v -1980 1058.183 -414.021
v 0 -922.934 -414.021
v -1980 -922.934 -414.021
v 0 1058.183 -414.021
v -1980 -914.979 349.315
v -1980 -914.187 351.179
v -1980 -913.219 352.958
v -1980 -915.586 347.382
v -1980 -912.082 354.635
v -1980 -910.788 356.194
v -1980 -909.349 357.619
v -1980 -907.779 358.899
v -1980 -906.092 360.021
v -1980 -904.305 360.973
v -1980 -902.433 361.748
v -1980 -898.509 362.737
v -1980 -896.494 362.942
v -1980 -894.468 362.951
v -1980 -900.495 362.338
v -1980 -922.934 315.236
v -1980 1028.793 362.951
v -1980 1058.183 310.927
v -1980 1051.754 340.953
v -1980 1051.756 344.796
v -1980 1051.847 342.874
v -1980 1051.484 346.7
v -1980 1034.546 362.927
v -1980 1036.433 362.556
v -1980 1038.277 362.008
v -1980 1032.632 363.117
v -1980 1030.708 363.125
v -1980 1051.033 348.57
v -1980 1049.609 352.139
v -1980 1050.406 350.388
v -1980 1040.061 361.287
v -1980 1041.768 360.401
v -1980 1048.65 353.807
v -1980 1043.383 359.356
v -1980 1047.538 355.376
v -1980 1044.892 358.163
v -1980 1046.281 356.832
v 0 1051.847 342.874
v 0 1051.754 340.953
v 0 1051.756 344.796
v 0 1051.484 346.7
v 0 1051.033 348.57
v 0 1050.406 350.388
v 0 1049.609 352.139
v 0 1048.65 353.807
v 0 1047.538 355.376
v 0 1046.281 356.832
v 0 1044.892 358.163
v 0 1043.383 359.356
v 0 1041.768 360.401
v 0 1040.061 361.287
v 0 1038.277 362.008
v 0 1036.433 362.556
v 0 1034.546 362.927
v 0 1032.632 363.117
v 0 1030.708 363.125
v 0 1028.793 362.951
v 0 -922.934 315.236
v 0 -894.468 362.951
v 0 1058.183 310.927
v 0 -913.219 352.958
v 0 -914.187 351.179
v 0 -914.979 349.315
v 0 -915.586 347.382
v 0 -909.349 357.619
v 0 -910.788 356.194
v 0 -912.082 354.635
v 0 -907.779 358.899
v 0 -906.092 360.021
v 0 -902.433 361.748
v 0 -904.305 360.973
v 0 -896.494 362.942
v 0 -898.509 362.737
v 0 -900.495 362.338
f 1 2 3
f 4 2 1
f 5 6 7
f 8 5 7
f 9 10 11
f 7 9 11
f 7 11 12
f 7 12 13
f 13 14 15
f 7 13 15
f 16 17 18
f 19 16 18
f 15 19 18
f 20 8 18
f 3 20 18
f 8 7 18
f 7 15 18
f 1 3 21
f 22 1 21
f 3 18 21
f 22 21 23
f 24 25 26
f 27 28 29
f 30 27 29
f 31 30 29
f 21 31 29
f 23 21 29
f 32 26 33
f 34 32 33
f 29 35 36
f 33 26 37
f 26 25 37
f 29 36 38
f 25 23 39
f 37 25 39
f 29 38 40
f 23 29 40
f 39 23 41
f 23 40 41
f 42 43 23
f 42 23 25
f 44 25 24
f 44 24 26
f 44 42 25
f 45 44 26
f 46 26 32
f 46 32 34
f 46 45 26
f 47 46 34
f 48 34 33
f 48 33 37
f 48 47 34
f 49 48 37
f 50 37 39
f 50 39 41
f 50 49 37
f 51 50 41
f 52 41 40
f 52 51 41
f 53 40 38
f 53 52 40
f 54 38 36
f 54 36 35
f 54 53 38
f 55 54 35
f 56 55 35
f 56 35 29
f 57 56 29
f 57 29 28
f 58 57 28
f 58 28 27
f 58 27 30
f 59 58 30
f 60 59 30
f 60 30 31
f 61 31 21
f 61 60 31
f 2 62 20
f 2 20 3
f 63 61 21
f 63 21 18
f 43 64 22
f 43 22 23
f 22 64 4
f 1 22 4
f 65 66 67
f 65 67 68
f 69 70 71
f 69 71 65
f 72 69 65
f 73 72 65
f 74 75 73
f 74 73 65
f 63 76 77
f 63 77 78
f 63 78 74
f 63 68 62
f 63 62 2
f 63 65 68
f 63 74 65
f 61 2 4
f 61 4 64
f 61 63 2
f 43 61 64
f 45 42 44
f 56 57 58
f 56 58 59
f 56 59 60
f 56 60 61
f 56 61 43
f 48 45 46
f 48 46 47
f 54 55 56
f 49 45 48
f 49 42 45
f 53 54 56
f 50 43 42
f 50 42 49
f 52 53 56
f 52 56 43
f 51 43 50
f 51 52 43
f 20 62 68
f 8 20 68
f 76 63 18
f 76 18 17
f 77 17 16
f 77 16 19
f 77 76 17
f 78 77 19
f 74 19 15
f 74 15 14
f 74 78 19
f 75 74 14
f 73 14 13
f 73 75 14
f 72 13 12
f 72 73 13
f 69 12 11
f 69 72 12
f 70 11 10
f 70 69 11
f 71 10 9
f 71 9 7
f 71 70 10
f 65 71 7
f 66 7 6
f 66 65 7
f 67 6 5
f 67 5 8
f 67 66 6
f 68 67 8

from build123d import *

# Parameters (mm, degrees)
PAD_DEPTH = 1980


with BuildPart() as part:
    # Sketch → Pad (new body)
    with BuildSketch(Plane.YZ):
        with BuildLine():
            Line((1058.18335, 310.926636), (1051.75415, 340.95297))
            ThreePointArc((1051.75415, 340.95297), (1045.602412, 357.51433), (1028.792586, 362.950531))
            Line((1028.792586, 362.950531), (-894.468415, 362.950531))
            ThreePointArc((-894.468415, 362.950531), (-907.779158, 358.899155), (-915.586365, 347.38234))
            Line((-922.933655, 315.235718), (-915.586365, 347.38234))
            Line((-922.933655, 315.235718), (-922.933655, -414.020752))
            Line((166.359161, -414.020752), (-922.933655, -414.020752))
            Line((166.359161, -414.020752), (1058.18335, -414.020752))
            Line((1058.18335, 310.926636), (1058.18335, -414.020752))
        make_face()
    extrude(amount=-PAD_DEPTH)


solid = part.part
